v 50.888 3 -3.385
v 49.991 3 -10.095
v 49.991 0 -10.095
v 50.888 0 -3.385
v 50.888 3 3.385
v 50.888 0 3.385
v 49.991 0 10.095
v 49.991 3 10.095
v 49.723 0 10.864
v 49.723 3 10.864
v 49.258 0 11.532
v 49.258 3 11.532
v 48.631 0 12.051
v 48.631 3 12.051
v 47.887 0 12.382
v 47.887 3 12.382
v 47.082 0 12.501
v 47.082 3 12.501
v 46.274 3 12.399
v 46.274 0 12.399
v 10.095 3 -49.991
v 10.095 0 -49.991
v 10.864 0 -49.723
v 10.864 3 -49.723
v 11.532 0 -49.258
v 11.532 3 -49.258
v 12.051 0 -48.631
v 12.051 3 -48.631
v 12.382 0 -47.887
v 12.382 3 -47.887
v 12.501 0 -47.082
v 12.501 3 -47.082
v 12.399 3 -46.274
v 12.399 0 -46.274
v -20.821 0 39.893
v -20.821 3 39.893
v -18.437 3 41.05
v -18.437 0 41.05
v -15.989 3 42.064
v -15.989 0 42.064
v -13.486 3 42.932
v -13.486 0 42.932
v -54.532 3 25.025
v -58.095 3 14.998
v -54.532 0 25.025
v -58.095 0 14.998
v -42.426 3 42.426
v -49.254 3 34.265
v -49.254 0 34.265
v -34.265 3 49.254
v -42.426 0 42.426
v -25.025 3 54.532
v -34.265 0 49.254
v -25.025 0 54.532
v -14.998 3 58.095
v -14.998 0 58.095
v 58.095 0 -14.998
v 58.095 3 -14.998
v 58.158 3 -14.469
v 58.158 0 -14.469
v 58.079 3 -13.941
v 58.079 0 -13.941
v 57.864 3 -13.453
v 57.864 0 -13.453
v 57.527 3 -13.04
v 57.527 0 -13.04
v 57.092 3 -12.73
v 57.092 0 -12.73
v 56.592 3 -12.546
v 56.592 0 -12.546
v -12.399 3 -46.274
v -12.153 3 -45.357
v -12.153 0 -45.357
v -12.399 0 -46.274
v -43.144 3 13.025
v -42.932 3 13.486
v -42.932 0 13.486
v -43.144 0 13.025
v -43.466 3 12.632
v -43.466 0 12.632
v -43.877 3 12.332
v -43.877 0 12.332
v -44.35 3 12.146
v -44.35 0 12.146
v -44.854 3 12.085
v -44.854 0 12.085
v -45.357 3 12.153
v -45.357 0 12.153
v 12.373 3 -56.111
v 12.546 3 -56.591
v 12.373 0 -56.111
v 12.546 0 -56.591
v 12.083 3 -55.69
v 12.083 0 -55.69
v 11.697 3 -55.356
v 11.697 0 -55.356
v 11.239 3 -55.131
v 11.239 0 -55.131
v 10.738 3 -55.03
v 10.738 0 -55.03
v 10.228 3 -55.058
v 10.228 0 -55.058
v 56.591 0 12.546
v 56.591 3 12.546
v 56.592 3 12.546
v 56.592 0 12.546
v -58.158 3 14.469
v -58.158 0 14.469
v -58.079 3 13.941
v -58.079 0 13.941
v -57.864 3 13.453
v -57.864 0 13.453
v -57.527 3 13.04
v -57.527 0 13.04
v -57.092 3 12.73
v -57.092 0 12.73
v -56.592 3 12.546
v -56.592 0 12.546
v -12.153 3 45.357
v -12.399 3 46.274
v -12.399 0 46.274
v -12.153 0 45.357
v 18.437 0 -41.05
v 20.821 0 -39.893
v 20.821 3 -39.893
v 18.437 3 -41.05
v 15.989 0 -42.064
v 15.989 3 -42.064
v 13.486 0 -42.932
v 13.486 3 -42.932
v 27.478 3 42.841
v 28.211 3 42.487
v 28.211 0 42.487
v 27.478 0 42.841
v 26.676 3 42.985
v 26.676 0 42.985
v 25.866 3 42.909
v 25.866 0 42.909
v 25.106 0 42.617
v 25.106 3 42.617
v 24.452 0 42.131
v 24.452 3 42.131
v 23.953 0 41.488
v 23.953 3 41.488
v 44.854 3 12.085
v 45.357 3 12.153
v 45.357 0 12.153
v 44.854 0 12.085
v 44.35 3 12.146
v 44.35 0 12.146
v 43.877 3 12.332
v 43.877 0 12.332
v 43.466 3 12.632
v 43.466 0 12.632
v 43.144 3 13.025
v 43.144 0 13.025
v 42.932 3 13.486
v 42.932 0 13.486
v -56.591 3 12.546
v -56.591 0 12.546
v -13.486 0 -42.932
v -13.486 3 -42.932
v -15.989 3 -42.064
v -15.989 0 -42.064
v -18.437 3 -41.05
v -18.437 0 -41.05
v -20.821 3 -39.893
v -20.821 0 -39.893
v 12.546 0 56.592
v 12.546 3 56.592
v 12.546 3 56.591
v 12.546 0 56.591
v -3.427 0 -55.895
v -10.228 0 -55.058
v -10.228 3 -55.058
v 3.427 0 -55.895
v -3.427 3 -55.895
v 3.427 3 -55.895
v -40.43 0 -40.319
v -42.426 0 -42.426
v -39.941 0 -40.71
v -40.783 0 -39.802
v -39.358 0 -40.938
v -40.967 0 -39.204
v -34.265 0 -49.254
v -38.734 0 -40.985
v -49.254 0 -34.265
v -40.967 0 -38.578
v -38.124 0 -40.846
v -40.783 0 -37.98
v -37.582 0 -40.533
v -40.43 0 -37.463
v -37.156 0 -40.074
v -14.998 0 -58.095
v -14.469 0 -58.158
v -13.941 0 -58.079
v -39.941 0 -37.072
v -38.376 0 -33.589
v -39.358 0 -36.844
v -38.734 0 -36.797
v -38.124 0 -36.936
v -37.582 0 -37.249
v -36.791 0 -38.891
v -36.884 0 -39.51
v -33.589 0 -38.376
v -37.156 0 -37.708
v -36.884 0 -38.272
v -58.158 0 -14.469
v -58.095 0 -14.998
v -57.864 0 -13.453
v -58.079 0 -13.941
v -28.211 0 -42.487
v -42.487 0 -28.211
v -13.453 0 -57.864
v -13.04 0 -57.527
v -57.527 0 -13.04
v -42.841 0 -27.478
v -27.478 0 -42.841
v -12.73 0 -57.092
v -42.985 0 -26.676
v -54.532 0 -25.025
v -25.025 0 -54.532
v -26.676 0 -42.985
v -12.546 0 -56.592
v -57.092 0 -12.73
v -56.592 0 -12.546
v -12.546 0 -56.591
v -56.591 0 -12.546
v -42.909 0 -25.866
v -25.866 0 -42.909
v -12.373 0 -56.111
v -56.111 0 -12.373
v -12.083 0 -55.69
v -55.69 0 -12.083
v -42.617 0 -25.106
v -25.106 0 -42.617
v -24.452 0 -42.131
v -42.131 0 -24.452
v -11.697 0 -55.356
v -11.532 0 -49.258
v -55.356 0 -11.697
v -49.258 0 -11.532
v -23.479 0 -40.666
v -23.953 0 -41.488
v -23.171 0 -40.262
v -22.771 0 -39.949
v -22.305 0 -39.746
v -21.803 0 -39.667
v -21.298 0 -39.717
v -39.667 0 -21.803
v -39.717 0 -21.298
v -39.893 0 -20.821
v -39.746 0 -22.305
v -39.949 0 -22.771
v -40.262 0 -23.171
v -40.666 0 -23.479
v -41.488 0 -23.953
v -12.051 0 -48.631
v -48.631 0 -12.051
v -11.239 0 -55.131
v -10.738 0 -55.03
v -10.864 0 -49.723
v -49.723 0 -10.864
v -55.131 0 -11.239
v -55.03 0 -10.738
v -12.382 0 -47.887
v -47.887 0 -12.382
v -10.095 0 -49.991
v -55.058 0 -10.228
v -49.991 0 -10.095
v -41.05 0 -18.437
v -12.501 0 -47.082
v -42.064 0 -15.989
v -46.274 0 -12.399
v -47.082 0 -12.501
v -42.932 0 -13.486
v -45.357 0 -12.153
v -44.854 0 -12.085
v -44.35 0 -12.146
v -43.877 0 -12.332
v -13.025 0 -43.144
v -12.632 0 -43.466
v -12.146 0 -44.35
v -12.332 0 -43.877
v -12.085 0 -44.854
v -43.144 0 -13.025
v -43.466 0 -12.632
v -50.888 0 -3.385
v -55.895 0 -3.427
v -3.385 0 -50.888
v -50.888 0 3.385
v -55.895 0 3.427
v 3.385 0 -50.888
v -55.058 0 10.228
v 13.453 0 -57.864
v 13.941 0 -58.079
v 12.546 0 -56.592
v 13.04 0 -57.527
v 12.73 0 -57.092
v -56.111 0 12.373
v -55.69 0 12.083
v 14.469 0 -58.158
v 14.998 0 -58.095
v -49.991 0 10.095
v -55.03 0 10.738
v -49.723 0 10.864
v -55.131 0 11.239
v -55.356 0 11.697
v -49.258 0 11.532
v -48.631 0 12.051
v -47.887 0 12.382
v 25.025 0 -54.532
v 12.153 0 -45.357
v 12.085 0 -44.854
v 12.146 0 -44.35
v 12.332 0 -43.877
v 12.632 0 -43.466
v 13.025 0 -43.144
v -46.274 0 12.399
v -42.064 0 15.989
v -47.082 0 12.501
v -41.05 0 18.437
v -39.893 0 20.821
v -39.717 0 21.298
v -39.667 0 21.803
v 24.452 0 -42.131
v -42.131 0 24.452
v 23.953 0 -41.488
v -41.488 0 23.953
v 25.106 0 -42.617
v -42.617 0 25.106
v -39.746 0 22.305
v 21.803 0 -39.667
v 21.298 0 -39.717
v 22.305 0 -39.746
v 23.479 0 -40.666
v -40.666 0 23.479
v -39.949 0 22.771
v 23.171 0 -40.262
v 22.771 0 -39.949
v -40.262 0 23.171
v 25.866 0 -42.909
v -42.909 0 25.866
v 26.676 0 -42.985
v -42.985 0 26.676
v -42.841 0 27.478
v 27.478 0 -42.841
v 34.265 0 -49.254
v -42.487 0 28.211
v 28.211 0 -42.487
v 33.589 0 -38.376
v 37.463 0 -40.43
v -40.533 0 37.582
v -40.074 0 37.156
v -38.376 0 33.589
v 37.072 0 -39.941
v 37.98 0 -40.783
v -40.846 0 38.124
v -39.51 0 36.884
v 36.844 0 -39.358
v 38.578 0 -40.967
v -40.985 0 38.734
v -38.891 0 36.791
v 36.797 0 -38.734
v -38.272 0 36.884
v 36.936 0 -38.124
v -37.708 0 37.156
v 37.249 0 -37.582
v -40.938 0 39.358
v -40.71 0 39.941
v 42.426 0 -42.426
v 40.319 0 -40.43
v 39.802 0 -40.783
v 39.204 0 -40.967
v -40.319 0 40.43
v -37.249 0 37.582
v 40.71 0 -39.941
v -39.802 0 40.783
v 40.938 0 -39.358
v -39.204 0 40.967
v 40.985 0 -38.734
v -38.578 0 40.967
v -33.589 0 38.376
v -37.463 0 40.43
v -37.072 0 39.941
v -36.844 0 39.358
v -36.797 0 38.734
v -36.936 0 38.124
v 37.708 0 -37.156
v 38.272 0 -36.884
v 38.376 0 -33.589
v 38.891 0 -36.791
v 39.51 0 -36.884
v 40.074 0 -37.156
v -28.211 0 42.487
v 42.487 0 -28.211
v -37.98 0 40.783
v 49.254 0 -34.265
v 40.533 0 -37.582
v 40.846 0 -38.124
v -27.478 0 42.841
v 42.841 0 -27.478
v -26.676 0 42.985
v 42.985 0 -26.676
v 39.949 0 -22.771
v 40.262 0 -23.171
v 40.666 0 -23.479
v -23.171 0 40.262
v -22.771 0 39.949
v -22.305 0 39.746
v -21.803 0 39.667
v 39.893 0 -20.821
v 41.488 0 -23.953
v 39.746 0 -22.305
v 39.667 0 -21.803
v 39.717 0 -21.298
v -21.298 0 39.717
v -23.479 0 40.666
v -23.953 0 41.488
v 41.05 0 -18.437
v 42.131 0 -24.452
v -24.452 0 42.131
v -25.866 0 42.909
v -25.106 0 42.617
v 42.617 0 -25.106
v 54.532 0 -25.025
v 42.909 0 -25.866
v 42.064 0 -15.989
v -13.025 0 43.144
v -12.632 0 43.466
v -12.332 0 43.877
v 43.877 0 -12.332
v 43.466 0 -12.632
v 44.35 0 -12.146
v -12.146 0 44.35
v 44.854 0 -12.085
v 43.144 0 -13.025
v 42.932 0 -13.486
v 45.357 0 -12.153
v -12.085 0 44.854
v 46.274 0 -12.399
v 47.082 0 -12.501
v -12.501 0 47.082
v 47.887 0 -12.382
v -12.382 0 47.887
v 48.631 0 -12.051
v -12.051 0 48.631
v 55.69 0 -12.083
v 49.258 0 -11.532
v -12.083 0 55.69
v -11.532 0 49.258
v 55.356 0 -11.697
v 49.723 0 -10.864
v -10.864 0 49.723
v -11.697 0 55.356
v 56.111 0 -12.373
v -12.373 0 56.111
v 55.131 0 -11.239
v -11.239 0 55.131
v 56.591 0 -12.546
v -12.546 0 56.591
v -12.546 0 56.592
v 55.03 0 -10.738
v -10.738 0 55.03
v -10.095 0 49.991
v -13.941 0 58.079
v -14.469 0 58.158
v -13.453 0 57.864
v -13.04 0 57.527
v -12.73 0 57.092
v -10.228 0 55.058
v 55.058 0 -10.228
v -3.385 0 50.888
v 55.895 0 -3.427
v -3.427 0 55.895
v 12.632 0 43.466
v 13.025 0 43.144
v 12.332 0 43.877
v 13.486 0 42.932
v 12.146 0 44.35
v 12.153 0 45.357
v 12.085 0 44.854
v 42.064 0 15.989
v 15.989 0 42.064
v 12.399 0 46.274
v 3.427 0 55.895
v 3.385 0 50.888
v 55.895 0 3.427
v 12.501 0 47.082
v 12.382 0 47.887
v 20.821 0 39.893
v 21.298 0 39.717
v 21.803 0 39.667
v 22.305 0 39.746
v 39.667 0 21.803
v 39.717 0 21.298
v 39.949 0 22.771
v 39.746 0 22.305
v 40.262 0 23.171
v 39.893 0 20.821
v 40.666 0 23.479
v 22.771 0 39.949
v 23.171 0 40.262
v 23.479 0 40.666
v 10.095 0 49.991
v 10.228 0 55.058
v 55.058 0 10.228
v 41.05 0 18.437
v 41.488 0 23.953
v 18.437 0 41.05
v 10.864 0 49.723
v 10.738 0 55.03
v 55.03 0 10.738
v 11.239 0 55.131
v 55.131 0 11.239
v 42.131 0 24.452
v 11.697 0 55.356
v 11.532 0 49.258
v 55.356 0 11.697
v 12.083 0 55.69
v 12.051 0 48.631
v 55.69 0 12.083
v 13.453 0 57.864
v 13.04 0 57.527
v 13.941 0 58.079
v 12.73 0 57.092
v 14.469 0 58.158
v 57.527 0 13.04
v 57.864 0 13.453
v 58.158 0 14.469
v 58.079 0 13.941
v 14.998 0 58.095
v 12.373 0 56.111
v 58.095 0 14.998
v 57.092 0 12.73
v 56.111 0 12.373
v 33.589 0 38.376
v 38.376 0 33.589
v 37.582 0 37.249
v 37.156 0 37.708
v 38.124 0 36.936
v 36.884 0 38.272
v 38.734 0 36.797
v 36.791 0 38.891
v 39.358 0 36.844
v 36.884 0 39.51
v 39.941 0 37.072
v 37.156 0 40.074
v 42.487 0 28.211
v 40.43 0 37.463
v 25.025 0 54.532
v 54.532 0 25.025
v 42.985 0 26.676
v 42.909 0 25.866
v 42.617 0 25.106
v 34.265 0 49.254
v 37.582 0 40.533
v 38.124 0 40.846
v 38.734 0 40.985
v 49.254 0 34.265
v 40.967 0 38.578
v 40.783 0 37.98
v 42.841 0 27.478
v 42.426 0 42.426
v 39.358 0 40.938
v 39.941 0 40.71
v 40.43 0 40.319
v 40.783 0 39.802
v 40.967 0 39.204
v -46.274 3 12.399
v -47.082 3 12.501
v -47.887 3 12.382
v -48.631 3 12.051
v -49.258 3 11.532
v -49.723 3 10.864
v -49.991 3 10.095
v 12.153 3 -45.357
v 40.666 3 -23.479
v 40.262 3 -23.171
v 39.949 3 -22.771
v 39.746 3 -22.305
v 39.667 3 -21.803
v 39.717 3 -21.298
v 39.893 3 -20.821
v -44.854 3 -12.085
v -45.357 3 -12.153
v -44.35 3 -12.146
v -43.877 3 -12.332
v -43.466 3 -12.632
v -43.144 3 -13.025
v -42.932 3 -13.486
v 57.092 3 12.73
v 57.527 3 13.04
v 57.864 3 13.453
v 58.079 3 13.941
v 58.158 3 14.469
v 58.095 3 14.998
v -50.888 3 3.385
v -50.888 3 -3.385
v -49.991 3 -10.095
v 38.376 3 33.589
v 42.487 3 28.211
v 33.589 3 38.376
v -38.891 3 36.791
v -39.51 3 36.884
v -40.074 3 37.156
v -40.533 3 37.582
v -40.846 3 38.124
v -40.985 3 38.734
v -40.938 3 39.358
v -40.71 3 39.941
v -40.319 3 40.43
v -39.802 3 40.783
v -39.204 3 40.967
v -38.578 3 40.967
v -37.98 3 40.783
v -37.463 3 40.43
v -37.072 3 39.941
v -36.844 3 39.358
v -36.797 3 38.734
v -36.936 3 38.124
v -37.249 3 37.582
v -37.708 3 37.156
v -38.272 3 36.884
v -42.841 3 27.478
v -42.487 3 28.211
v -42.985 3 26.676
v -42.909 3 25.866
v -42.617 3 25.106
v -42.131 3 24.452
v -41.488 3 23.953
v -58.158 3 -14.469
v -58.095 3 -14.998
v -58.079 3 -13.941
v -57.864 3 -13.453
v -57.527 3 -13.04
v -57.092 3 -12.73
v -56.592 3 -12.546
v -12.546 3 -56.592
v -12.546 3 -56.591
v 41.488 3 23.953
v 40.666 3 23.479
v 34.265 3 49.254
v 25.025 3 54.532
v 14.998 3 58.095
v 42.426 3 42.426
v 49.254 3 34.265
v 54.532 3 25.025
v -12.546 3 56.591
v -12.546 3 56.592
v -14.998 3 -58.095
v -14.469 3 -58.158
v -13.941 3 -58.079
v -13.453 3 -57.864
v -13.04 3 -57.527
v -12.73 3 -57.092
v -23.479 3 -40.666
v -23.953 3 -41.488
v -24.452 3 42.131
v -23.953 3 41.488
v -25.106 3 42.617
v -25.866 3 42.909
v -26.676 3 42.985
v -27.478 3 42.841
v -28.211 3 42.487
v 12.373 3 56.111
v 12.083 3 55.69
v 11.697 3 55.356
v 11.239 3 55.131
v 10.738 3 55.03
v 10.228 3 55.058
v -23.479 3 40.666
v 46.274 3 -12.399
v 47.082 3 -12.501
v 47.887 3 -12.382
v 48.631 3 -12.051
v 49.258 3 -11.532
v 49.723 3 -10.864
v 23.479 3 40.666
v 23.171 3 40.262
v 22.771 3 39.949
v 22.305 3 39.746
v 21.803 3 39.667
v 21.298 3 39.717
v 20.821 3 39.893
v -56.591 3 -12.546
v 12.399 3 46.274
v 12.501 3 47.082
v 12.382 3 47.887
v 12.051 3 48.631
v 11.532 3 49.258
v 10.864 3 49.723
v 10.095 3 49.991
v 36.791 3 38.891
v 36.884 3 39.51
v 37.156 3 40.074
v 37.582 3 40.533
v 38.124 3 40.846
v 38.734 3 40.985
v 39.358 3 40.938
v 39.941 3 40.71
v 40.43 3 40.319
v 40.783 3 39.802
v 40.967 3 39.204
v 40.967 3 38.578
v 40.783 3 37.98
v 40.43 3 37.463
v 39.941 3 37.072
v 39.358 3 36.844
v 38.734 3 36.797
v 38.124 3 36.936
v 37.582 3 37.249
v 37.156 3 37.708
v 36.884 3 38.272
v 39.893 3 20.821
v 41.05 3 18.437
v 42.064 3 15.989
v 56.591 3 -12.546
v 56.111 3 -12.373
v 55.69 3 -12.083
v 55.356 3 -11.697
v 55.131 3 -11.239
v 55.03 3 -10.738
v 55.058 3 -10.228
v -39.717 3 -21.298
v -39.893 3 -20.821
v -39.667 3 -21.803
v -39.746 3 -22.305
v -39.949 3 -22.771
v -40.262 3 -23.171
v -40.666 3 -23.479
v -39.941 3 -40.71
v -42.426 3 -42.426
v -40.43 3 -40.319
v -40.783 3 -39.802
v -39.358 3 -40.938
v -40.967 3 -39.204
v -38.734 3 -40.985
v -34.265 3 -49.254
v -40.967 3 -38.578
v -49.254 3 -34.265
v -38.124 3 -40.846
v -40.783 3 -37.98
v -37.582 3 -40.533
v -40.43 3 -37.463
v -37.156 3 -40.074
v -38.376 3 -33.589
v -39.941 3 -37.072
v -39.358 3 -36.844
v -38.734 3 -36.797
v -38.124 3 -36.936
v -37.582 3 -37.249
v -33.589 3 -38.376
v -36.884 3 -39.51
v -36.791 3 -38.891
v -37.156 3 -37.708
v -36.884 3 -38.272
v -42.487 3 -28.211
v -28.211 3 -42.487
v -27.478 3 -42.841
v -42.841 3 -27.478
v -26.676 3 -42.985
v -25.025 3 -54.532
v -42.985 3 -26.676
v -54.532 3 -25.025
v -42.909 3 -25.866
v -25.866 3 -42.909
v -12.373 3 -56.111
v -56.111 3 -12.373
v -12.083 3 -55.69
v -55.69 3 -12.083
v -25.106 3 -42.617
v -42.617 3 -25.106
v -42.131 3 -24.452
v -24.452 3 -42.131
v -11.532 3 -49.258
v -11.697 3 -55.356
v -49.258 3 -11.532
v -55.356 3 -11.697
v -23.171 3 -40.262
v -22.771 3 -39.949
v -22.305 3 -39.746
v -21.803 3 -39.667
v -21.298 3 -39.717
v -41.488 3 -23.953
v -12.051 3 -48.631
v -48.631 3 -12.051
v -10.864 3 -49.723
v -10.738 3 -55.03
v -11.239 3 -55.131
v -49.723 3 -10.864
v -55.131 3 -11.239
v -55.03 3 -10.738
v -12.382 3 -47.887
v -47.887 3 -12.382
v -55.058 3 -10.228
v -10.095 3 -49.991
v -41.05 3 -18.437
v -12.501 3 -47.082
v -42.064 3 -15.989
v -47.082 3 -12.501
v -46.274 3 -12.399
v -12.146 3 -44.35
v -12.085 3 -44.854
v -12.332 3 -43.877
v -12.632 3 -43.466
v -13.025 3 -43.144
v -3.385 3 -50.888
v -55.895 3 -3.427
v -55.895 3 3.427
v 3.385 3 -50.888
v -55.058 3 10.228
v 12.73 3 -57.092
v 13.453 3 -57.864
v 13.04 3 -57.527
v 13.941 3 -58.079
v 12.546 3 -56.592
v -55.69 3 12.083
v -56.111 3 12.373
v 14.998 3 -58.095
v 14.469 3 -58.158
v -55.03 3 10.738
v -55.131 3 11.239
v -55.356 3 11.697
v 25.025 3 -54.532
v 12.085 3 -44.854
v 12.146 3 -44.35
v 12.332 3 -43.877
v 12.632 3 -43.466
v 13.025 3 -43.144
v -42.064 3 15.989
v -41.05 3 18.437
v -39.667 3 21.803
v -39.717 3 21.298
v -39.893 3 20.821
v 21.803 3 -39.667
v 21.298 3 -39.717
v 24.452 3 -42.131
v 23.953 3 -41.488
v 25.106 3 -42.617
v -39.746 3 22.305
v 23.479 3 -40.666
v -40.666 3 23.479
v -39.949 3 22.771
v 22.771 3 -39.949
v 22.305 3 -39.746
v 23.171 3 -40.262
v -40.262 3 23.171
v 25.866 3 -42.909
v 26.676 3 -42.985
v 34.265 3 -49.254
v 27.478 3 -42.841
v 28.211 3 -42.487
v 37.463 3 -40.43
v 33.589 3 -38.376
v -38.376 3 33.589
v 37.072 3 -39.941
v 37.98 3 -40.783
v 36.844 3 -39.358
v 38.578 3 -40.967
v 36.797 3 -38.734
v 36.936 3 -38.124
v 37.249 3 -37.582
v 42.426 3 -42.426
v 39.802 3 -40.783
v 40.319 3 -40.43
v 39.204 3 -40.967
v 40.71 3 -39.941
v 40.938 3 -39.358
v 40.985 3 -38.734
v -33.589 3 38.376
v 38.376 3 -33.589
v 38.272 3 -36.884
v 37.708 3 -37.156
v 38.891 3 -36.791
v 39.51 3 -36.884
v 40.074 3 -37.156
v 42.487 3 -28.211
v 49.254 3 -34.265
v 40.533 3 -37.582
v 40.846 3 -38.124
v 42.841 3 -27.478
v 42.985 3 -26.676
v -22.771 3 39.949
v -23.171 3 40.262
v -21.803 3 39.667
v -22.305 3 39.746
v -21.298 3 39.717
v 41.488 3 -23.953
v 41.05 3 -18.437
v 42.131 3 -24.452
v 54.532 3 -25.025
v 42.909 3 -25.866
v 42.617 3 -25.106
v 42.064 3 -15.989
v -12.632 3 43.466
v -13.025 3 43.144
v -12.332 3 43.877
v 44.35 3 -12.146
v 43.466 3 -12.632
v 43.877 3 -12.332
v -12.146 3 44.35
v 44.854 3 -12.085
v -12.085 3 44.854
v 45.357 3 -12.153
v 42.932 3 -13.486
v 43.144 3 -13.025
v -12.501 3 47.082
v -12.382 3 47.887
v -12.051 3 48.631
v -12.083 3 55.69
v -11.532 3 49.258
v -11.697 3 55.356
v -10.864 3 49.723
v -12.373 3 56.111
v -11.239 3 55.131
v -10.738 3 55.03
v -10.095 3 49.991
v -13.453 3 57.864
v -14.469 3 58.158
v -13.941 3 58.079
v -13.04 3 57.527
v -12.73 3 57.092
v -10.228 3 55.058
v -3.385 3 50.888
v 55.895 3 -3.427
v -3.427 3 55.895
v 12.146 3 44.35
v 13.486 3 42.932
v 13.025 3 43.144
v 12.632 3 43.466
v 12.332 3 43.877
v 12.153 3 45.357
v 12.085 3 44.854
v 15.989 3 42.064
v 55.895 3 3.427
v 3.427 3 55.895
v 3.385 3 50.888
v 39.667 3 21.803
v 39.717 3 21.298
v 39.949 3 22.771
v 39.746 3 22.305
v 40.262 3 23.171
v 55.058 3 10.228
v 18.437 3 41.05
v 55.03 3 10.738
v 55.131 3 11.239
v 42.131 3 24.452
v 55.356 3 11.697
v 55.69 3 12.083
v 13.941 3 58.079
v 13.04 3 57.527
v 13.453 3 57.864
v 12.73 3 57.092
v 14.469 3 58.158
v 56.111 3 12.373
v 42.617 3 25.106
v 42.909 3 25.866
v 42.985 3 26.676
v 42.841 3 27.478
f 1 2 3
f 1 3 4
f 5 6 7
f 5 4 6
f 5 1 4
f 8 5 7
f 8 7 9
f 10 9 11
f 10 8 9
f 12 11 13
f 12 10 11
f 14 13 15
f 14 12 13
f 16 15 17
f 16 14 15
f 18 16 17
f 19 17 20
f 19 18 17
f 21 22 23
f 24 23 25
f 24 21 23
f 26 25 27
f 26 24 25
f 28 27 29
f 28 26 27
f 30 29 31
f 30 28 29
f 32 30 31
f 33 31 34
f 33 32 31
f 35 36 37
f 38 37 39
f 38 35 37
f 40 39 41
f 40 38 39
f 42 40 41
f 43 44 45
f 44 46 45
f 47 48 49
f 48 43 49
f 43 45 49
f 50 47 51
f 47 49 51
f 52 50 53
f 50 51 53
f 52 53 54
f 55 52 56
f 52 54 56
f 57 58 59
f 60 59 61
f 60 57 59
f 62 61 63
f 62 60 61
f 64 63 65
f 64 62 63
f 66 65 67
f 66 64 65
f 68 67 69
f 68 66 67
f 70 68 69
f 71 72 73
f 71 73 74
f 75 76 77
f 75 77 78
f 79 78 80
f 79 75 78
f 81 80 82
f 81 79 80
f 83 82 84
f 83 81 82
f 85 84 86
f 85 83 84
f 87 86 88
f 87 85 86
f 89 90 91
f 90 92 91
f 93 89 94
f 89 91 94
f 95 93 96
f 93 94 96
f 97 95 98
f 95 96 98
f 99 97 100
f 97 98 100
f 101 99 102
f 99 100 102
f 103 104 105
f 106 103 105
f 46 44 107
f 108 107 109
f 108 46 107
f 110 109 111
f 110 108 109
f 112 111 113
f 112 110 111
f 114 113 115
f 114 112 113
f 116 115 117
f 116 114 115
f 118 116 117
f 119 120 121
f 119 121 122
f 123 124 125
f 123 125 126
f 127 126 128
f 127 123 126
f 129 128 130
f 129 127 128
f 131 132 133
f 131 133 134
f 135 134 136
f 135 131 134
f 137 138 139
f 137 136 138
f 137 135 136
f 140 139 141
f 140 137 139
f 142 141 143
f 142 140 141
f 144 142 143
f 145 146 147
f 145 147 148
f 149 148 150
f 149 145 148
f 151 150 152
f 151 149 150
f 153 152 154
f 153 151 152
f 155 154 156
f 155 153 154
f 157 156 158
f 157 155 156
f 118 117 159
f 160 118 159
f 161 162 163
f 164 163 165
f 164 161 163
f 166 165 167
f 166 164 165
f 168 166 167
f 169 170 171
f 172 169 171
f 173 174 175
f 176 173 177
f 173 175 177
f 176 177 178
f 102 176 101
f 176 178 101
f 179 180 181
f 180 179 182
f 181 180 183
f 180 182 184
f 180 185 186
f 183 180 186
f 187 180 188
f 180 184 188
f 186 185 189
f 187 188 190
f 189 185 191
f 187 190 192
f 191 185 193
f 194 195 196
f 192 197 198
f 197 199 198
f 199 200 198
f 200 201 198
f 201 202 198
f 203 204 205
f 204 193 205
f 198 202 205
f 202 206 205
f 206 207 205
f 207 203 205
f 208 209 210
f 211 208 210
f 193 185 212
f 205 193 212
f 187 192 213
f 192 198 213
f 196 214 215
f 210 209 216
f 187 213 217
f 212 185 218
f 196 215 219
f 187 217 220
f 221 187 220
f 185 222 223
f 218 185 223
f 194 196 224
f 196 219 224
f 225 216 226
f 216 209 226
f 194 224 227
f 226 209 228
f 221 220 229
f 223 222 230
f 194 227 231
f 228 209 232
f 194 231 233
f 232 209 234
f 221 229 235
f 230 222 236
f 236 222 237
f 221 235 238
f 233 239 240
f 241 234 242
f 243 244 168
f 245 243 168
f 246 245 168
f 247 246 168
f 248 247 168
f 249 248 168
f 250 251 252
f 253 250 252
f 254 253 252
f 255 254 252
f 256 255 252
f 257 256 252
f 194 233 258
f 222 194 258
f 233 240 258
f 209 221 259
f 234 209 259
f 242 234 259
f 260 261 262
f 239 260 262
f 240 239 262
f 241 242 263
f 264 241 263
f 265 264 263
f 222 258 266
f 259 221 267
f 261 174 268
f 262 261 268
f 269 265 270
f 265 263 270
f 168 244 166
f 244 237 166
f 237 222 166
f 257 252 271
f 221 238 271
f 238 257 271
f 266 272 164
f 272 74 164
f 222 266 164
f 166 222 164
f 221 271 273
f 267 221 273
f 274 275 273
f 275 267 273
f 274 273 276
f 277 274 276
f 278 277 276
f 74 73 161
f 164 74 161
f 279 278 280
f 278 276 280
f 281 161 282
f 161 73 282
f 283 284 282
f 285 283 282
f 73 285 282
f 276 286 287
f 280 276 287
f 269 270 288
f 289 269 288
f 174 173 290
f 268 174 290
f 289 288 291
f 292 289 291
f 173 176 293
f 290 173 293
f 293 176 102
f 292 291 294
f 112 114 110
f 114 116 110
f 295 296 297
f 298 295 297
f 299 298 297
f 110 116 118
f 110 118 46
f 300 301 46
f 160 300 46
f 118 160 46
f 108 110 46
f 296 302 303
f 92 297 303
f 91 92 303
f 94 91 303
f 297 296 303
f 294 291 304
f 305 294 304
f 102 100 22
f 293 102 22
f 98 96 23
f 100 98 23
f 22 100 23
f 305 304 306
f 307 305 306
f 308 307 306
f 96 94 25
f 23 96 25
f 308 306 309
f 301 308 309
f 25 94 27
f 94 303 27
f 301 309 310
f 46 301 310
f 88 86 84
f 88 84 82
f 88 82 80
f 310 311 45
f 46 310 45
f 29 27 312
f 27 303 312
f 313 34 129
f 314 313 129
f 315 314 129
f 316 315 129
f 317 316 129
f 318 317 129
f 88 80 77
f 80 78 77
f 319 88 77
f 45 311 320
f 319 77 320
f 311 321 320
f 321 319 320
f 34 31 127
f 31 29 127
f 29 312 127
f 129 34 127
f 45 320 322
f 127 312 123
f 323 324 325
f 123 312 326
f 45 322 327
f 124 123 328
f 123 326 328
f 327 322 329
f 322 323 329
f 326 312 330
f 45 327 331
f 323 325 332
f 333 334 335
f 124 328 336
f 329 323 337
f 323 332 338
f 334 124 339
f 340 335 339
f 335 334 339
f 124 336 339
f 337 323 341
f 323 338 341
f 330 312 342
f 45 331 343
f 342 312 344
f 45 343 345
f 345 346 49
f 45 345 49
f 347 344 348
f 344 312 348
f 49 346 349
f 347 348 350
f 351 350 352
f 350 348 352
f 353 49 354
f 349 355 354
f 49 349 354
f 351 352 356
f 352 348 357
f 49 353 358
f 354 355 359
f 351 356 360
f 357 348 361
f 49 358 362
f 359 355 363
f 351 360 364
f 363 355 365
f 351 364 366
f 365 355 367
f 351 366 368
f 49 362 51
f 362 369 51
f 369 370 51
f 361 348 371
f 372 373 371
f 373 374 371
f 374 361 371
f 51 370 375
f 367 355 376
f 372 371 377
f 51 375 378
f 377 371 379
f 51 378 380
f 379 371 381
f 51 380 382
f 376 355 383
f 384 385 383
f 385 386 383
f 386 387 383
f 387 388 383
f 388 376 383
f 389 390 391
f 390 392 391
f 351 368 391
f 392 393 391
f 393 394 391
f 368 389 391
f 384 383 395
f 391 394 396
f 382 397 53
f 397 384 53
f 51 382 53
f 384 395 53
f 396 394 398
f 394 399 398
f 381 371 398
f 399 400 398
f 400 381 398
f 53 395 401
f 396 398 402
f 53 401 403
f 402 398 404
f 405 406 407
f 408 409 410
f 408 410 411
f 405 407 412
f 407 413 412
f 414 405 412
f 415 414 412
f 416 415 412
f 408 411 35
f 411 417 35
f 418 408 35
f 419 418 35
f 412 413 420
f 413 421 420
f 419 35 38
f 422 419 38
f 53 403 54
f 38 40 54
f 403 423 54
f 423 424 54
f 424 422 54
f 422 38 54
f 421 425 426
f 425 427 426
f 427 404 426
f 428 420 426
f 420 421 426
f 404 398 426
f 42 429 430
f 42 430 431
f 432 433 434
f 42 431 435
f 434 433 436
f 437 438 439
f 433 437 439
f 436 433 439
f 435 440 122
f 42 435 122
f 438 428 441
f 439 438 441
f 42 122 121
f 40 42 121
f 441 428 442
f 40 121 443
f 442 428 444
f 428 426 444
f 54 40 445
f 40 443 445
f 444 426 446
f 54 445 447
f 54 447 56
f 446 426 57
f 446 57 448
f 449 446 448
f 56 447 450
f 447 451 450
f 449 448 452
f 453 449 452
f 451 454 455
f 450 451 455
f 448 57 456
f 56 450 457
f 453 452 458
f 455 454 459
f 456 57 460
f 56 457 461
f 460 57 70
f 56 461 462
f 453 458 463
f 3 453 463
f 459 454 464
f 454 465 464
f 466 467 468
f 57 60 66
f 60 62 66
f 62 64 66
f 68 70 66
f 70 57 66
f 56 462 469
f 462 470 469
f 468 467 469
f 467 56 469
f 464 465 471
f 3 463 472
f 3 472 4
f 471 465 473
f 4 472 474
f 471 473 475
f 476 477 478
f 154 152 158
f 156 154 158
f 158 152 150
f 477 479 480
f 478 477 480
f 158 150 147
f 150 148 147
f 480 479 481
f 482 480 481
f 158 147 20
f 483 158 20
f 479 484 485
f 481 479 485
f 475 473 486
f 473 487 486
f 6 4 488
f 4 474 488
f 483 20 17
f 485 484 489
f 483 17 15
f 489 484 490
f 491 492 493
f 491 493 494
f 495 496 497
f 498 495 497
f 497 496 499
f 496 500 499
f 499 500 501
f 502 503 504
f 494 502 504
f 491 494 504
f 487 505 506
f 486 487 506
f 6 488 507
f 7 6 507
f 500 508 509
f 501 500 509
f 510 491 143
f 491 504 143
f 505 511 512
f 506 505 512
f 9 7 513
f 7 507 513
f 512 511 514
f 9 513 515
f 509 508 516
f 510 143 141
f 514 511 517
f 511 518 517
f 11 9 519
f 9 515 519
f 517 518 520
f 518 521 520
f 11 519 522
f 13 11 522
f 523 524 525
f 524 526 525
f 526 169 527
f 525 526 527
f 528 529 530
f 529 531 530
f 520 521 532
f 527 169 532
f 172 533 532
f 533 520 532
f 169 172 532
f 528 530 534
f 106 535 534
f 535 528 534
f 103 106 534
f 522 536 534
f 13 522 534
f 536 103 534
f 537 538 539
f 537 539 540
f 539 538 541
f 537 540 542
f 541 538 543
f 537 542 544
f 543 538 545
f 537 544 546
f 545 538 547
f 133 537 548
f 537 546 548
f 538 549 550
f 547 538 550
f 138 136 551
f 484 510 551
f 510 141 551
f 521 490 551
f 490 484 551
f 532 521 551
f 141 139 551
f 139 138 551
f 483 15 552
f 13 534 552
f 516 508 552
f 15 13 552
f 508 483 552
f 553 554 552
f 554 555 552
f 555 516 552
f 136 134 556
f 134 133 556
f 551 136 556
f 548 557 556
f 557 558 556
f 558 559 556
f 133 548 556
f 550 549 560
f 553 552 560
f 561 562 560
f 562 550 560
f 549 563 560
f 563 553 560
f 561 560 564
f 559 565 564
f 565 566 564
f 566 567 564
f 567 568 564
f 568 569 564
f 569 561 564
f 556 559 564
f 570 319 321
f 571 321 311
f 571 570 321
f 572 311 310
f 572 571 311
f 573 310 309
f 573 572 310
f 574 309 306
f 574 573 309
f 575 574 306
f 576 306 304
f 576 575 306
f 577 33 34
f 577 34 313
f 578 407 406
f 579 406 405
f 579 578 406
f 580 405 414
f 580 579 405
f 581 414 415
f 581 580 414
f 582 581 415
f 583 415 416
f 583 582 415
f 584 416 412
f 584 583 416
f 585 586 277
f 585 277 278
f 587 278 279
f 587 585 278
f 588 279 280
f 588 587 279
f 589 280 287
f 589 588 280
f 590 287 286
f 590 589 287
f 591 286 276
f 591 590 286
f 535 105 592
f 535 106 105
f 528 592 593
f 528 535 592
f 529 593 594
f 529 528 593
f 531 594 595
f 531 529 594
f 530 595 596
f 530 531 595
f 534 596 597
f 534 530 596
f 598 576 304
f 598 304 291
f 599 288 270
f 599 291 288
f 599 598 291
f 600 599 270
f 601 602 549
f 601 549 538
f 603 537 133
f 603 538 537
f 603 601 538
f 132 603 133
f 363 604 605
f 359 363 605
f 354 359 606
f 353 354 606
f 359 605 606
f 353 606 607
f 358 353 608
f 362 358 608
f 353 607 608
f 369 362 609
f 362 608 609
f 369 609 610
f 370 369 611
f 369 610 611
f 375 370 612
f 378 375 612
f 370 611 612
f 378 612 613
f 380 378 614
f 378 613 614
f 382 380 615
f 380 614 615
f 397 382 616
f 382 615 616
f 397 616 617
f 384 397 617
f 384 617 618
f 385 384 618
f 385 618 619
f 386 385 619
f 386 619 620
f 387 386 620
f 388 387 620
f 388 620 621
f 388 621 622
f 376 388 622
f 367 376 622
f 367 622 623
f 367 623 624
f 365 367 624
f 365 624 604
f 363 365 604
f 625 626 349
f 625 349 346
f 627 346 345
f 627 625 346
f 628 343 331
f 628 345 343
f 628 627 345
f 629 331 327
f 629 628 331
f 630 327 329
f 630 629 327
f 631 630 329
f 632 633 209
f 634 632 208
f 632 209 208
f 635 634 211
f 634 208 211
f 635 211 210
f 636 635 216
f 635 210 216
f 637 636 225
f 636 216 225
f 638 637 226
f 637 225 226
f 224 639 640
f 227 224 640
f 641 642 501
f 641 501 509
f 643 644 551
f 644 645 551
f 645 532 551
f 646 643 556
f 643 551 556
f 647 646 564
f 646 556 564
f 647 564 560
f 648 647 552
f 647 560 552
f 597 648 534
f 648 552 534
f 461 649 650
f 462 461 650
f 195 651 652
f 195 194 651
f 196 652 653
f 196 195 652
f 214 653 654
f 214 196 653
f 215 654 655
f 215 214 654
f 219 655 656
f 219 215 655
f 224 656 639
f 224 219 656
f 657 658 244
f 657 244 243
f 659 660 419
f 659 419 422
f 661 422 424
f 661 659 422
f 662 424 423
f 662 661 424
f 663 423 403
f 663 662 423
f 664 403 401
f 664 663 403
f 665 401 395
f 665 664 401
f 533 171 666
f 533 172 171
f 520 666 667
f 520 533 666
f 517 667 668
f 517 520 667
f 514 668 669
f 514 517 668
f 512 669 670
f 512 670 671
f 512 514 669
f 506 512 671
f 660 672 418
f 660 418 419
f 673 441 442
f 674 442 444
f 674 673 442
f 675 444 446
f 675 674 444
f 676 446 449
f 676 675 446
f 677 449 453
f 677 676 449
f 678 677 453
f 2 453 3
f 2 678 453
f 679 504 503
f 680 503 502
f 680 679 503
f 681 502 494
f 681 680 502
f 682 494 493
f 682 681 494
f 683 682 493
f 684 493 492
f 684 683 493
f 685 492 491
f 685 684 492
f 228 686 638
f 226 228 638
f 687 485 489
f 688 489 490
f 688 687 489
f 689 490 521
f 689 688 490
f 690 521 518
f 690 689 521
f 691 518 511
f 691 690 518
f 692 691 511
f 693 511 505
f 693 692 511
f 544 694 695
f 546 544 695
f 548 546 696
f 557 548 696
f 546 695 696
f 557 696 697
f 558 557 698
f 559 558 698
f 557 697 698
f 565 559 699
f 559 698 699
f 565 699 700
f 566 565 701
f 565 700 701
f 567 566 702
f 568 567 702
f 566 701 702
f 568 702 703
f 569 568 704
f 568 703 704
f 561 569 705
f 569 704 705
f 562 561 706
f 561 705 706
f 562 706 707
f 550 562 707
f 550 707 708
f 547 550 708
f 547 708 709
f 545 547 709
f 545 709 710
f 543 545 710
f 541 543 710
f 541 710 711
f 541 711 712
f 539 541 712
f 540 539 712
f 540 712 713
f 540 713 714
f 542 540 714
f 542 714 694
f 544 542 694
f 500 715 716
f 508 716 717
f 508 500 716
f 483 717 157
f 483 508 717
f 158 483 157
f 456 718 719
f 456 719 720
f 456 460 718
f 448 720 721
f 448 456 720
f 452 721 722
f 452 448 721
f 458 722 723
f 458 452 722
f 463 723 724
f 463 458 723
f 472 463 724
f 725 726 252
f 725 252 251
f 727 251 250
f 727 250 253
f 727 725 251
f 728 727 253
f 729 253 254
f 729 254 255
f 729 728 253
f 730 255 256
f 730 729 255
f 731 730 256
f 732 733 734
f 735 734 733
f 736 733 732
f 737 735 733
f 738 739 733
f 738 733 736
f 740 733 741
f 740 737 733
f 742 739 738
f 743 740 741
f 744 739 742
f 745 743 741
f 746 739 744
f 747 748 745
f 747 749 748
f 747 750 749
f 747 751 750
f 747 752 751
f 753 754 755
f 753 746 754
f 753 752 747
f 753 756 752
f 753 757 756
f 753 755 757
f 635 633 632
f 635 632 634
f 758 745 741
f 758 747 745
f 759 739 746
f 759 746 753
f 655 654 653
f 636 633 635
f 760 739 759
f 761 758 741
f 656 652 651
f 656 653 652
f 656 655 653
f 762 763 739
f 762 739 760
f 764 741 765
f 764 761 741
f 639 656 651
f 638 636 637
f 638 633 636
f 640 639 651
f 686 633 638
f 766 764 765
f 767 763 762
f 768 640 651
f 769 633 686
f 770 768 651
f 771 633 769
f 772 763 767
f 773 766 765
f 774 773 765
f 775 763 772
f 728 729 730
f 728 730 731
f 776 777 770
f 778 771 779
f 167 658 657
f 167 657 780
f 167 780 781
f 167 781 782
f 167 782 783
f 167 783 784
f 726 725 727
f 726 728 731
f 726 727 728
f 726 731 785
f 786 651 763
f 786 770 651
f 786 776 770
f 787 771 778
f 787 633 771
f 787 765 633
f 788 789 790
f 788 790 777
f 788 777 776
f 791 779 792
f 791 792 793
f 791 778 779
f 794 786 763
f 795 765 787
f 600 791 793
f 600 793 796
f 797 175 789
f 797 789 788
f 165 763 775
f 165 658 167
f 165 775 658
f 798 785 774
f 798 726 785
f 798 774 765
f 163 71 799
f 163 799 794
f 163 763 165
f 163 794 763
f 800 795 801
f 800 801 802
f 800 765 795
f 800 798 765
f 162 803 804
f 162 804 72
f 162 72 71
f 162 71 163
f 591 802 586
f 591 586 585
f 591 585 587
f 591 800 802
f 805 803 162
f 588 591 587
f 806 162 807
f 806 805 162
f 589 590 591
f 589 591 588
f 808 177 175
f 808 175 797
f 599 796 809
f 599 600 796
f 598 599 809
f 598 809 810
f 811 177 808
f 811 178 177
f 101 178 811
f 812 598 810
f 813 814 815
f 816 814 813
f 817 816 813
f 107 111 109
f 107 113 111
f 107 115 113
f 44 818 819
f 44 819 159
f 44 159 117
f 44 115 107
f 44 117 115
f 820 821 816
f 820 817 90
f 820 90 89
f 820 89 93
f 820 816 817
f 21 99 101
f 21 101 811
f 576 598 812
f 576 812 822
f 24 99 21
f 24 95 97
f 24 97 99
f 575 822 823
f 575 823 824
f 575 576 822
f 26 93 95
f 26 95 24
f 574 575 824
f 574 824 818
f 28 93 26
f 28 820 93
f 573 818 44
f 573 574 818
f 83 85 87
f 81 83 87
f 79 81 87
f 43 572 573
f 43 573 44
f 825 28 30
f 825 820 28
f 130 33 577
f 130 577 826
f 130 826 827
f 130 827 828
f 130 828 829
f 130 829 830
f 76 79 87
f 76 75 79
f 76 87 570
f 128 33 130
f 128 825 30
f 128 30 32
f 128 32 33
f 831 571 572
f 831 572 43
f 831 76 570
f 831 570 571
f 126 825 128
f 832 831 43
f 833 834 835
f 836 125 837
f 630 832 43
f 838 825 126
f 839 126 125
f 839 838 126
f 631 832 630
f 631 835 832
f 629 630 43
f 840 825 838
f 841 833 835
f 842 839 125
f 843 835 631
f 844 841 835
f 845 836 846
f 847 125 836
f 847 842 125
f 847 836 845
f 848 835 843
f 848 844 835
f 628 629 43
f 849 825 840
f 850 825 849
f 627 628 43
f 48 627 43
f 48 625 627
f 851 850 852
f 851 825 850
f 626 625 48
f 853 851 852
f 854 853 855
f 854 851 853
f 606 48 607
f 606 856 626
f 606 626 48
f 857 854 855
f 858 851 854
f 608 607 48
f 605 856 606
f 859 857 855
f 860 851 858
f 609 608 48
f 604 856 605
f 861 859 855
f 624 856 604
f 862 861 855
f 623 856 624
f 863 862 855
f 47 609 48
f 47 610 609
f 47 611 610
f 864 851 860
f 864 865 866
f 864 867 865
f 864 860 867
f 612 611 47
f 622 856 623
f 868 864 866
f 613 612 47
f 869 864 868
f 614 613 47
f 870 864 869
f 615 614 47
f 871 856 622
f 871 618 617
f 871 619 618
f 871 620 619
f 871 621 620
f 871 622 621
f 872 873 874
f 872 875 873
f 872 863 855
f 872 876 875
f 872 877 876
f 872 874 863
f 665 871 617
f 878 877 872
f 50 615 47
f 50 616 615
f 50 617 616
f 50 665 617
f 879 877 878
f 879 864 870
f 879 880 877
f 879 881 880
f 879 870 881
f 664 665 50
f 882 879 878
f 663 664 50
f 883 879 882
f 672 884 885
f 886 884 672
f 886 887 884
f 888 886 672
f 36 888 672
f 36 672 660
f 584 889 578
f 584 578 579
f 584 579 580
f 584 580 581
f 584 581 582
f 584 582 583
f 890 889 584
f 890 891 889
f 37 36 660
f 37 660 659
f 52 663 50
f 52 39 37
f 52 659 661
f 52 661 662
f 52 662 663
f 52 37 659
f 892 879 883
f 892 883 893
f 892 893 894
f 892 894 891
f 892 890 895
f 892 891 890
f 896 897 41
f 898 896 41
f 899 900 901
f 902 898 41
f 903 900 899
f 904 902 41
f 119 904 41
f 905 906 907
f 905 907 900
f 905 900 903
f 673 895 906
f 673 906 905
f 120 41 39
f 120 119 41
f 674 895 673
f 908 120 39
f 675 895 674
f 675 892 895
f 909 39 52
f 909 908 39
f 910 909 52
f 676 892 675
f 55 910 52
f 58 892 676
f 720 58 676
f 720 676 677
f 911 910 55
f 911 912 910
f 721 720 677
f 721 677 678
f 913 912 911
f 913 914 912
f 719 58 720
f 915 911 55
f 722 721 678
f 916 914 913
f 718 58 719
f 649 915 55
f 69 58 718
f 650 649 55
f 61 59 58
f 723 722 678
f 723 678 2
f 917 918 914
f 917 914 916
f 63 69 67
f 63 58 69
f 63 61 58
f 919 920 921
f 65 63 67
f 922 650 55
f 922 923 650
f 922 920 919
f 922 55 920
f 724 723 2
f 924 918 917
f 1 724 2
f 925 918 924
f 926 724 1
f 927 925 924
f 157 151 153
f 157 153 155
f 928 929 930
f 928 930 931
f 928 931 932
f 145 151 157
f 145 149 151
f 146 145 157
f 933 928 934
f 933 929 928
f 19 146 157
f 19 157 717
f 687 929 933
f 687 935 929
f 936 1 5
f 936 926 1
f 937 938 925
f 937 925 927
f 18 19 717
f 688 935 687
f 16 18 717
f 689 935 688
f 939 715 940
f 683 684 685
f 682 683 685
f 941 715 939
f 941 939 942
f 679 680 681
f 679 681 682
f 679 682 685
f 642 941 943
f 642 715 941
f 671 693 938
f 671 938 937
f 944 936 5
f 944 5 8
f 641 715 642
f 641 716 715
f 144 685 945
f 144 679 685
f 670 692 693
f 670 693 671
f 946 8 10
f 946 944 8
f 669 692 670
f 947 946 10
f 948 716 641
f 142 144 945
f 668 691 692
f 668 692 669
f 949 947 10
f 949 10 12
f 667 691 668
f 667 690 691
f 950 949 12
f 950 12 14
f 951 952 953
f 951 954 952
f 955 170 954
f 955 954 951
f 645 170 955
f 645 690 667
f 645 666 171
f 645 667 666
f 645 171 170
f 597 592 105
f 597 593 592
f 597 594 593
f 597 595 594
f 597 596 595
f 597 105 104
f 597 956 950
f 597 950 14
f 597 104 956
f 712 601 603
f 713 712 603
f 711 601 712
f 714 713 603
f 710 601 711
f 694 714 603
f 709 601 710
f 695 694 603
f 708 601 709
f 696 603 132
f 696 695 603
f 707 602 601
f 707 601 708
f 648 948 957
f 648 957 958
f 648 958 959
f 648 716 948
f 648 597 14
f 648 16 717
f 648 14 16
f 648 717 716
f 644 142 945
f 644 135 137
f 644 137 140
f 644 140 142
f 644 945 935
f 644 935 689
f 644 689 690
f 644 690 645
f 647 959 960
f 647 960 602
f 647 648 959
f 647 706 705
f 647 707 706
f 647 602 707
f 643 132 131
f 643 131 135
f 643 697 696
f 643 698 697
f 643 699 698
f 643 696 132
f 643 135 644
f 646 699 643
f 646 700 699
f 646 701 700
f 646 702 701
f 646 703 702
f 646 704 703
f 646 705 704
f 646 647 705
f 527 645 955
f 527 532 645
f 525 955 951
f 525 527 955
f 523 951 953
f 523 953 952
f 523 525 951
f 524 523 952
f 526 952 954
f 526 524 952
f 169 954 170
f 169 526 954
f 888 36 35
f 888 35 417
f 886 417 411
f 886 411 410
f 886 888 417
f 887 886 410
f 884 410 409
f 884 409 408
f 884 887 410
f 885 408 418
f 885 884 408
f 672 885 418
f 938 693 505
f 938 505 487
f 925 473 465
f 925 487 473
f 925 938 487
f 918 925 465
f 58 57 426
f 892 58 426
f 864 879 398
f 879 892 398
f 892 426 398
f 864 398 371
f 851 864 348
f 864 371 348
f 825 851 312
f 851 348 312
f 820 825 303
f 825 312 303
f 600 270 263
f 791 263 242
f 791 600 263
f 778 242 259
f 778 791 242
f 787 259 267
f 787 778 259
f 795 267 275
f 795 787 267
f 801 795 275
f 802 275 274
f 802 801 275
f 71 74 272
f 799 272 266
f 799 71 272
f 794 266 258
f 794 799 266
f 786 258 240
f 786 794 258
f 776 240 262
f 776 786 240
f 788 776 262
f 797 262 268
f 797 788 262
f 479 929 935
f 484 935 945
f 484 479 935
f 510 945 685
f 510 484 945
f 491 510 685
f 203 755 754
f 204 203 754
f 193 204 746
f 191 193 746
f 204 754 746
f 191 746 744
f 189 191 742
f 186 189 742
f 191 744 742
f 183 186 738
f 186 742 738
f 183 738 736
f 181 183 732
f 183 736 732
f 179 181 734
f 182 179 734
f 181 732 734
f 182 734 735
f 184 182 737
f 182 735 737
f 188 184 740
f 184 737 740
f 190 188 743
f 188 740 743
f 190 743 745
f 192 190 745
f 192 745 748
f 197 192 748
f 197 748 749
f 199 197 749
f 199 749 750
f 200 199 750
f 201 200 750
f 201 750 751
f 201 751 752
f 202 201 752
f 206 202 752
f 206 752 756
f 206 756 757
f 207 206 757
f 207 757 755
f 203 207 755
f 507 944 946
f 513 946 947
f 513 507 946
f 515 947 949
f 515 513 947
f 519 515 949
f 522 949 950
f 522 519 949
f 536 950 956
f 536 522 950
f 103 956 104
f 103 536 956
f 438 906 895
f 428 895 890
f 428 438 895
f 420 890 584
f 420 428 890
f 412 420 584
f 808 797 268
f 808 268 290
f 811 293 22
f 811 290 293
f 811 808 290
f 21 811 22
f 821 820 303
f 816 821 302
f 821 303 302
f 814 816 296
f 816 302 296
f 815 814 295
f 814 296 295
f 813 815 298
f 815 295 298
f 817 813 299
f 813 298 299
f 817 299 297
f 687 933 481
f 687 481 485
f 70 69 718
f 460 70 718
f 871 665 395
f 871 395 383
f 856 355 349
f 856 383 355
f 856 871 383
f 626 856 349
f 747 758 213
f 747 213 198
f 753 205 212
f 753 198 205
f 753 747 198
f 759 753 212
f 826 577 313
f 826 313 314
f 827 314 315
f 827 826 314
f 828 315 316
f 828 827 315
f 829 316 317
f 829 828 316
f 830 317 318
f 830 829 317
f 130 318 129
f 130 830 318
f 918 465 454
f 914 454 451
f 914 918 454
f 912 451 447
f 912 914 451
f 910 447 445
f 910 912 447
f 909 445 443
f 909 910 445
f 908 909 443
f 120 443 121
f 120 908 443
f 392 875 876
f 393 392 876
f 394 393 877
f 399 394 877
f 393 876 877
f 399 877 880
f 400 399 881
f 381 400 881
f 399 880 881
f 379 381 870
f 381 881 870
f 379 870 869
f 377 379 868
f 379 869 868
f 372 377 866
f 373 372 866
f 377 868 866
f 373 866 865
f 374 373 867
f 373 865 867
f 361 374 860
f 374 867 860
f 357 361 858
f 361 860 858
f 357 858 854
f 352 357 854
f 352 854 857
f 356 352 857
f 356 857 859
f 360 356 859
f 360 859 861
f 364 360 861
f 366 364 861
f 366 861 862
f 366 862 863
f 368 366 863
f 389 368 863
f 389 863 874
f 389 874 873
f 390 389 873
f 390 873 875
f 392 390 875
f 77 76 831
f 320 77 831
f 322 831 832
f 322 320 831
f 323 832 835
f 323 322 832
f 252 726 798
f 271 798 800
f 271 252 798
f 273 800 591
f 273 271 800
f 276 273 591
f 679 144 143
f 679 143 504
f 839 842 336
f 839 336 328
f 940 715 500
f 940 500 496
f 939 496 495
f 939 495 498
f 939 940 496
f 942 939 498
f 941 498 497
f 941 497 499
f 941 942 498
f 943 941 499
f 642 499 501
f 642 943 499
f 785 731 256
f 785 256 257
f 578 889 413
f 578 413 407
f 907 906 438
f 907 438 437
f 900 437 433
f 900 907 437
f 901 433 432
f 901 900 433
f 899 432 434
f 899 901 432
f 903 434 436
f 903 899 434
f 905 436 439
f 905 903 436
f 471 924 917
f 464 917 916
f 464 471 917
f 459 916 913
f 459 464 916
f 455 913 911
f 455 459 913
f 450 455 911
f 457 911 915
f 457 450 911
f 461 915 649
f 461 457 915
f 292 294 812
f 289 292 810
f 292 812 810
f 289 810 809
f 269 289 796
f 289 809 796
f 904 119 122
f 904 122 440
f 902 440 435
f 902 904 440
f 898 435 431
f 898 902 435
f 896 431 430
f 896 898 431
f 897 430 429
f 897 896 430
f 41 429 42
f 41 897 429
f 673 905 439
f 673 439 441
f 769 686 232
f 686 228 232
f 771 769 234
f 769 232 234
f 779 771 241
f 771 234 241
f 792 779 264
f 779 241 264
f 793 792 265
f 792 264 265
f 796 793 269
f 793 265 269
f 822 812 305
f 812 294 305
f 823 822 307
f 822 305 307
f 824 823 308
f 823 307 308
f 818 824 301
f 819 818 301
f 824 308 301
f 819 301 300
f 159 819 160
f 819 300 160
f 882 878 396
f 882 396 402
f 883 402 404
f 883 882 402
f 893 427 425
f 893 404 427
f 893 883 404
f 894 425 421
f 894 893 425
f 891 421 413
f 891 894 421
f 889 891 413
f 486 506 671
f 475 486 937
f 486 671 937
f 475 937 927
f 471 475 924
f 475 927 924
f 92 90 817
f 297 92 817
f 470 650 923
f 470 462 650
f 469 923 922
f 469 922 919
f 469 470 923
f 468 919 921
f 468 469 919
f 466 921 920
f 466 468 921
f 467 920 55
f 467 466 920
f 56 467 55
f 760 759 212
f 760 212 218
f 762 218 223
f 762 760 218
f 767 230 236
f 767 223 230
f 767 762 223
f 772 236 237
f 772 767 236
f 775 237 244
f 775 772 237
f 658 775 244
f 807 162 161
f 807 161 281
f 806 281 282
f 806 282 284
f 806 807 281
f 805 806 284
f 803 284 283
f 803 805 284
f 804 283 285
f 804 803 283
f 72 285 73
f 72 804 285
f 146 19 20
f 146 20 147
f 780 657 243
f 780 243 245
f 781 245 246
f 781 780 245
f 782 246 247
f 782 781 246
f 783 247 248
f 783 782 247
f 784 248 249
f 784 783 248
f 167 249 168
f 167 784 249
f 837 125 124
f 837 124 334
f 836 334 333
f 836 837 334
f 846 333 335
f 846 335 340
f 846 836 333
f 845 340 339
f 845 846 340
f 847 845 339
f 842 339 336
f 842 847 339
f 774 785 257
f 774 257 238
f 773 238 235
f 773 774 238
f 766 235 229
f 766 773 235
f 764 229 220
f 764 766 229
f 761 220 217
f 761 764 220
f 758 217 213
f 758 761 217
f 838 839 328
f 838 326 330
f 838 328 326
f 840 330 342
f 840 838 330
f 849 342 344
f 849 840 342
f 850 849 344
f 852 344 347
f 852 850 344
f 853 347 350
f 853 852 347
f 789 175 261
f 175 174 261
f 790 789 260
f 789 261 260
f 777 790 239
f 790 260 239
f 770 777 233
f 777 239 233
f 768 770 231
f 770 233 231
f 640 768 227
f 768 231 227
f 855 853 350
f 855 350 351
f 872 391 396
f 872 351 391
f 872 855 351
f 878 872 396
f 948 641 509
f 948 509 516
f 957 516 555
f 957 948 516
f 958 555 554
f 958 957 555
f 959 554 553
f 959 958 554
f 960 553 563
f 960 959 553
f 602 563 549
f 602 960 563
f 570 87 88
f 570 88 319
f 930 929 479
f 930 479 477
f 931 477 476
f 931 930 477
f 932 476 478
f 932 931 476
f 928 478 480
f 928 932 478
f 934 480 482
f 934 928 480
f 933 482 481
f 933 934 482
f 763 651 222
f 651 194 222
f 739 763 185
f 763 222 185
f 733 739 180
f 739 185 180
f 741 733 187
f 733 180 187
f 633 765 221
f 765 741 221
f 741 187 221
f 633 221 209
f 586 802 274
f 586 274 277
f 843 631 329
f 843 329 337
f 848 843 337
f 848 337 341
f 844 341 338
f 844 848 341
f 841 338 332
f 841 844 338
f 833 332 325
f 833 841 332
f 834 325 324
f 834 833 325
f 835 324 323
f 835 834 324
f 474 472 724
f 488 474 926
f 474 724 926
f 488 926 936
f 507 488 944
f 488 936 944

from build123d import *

# Parameters (mm, degrees)
SKETCH1_R                       = 60
SKETCH1_R_2                     = 45
BOSS_EXTRUDE1_DEPTH             = 3
CUT_EXTRUDE1_DEPTH              = 85.905830189
CIRPATTERN1_COUNT               = 8
SKETCH3_R                       = 2.1
CUT_EXTRUDE2_DEPTH              = 85.905830189
CIRPATTERN2_COUNT               = 4
SCHNITT_LINEAR_AUSTRAGEN1_DEPTH = 85.905830189
VERRUNDUNG2_R                   = 2
KREISMUSTER7_COUNT              = 4
VERRUNDUNG2_OF_KREISMUSTER7_R   = 2


with BuildPart() as part:
    # Sketch1 → Boss-Extrude1 (new body)
    with BuildSketch(Plane(origin=(0, 0, 0), x_dir=(1, 0, 0), z_dir=(0, 1, 0))):
        with Locations(Location((0, 0, 0), (0, 0, 270))):
            Circle(SKETCH1_R)
        with Locations(Location((0, 0, 0), (0, 0, 270))):
            Circle(SKETCH1_R_2, mode=Mode.SUBTRACT)
    extrude(amount=BOSS_EXTRUDE1_DEPTH)

    # Sketch2 → Cut-Extrude1 (cut, through all)
    with BuildSketch(Plane(origin=(0, 3, 0), x_dir=(1, 0, 0), z_dir=(0, 1, 0))):
        with BuildLine():
            Line((12.399026137, 46.273795509), (12.153476553, 45.357391985))
            ThreePointArc((12.153476553, 45.357391985), (12.332388249, 43.876840862), (13.485952537, 42.931679261))
            Line((13.485952537, 42.931679261), (-13.485952537, 42.931679261))
            ThreePointArc((-13.485952537, 42.931679261), (-12.332388249, 43.876840862), (-12.153476553, 45.357391985))
            Line((-12.153476553, 45.357391985), (-12.399026137, 46.273795509))
            ThreePointArc((-12.399026137, 46.273795509), (-12.051156799, 48.63074892), (-10.0950767, 49.990893435))
            ThreePointArc((-10.0950767, 49.990893435), (0, 51), (10.0950767, 49.990893435))
            ThreePointArc((10.0950767, 49.990893435), (12.051156799, 48.63074892), (12.399026137, 46.273795509))
        make_face()
    cut_extrude1 = extrude(amount=-CUT_EXTRUDE1_DEPTH, mode=Mode.SUBTRACT)

    # CirPattern1: Cut-Extrude1 ×8 about axis
    cirpattern1_axis = Axis((0, 0, 0), (0, 1, 0))
    for i in range(1, CIRPATTERN1_COUNT):
        add(cut_extrude1.rotate(cirpattern1_axis, i * 360 / CIRPATTERN1_COUNT), mode=Mode.SUBTRACT)

    # Sketch3 → Cut-Extrude2 (cut, through all)
    with BuildSketch(Plane(origin=(0, 3, 0), x_dir=(1, 0, 0), z_dir=(0, 1, 0))):
        with Locations(Location((38.890872965, 38.890872965, 0), (0, 0, 270))):
            Circle(SKETCH3_R)
    cut_extrude2 = extrude(amount=-CUT_EXTRUDE2_DEPTH, mode=Mode.SUBTRACT)

    # CirPattern2: Cut-Extrude2 ×4 about axis
    cirpattern2_axis = Axis((0, 0, 0), (0, 1, 0))
    for i in range(1, CIRPATTERN2_COUNT):
        add(cut_extrude2.rotate(cirpattern2_axis, i * 360 / CIRPATTERN2_COUNT), mode=Mode.SUBTRACT)

    # Skizze1 → Schnitt-Linear austragen1 (cut, through all)
    with BuildSketch(Plane(origin=(0, 3, 0), x_dir=(1, 0, 0), z_dir=(0, 1, 0))):
        with BuildLine():
            Line((-12.986376836, 58.577760427), (-12.120618381, 54.672576399))
            ThreePointArc((-12.120618381, 54.672576399), (0, 56), (12.120618381, 54.672576399))
            Line((12.120618381, 54.672576399), (12.986376836, 58.577760427))
            ThreePointArc((12.986376836, 58.577760427), (0, 60), (-12.986376836, 58.577760427))
        make_face()
    schnitt_linear_austragen1 = extrude(amount=-SCHNITT_LINEAR_AUSTRAGEN1_DEPTH, mode=Mode.SUBTRACT)

    # Verrundung2
    verrundung2_edges = [part.edges().sort_by_distance(p)[0] for p in [
        (-12.986376836, 1.5, -58.577760427),
        (-12.120618381, 1.5, -54.672576399),
        (12.986376836, 1.5, -58.577760427),
        (12.120618381, 1.5, -54.672576399),
    ]]
    fillet(verrundung2_edges, radius=VERRUNDUNG2_R - 0.0001)  # a hair under: the kernel refuses the full size

    # Kreismuster7: Schnitt-Linear austragen1 ×4 about axis
    kreismuster7_axis = Axis((0, 0, 0), (0, 1, 0))
    for i in range(1, KREISMUSTER7_COUNT):
        add(schnitt_linear_austragen1.rotate(kreismuster7_axis, i * 360 / KREISMUSTER7_COUNT), mode=Mode.SUBTRACT)

    # Verrundung2 of Kreismuster7
    verrundung2_of_kreismuster7_edges = [part.edges().sort_by_distance(p)[0] for p in [
        (-58.577760427, 1.5, 12.986376836),
        (-54.672576399, 1.5, 12.120618381),
        (-58.577760427, 1.5, -12.986376836),
        (-54.672576399, 1.5, -12.120618381),
        (12.986376836, 1.5, 58.577760427),
        (12.120618381, 1.5, 54.672576399),
        (-12.986376836, 1.5, 58.577760427),
        (-12.120618381, 1.5, 54.672576399),
        (58.577760427, 1.5, -12.986376836),
        (54.672576399, 1.5, -12.120618381),
        (58.577760427, 1.5, 12.986376836),
        (54.672576399, 1.5, 12.120618381),
    ]]
    fillet(verrundung2_of_kreismuster7_edges, radius=VERRUNDUNG2_OF_KREISMUSTER7_R - 0.0001)  # a hair under: the kernel refuses the full size


solid = part.part
